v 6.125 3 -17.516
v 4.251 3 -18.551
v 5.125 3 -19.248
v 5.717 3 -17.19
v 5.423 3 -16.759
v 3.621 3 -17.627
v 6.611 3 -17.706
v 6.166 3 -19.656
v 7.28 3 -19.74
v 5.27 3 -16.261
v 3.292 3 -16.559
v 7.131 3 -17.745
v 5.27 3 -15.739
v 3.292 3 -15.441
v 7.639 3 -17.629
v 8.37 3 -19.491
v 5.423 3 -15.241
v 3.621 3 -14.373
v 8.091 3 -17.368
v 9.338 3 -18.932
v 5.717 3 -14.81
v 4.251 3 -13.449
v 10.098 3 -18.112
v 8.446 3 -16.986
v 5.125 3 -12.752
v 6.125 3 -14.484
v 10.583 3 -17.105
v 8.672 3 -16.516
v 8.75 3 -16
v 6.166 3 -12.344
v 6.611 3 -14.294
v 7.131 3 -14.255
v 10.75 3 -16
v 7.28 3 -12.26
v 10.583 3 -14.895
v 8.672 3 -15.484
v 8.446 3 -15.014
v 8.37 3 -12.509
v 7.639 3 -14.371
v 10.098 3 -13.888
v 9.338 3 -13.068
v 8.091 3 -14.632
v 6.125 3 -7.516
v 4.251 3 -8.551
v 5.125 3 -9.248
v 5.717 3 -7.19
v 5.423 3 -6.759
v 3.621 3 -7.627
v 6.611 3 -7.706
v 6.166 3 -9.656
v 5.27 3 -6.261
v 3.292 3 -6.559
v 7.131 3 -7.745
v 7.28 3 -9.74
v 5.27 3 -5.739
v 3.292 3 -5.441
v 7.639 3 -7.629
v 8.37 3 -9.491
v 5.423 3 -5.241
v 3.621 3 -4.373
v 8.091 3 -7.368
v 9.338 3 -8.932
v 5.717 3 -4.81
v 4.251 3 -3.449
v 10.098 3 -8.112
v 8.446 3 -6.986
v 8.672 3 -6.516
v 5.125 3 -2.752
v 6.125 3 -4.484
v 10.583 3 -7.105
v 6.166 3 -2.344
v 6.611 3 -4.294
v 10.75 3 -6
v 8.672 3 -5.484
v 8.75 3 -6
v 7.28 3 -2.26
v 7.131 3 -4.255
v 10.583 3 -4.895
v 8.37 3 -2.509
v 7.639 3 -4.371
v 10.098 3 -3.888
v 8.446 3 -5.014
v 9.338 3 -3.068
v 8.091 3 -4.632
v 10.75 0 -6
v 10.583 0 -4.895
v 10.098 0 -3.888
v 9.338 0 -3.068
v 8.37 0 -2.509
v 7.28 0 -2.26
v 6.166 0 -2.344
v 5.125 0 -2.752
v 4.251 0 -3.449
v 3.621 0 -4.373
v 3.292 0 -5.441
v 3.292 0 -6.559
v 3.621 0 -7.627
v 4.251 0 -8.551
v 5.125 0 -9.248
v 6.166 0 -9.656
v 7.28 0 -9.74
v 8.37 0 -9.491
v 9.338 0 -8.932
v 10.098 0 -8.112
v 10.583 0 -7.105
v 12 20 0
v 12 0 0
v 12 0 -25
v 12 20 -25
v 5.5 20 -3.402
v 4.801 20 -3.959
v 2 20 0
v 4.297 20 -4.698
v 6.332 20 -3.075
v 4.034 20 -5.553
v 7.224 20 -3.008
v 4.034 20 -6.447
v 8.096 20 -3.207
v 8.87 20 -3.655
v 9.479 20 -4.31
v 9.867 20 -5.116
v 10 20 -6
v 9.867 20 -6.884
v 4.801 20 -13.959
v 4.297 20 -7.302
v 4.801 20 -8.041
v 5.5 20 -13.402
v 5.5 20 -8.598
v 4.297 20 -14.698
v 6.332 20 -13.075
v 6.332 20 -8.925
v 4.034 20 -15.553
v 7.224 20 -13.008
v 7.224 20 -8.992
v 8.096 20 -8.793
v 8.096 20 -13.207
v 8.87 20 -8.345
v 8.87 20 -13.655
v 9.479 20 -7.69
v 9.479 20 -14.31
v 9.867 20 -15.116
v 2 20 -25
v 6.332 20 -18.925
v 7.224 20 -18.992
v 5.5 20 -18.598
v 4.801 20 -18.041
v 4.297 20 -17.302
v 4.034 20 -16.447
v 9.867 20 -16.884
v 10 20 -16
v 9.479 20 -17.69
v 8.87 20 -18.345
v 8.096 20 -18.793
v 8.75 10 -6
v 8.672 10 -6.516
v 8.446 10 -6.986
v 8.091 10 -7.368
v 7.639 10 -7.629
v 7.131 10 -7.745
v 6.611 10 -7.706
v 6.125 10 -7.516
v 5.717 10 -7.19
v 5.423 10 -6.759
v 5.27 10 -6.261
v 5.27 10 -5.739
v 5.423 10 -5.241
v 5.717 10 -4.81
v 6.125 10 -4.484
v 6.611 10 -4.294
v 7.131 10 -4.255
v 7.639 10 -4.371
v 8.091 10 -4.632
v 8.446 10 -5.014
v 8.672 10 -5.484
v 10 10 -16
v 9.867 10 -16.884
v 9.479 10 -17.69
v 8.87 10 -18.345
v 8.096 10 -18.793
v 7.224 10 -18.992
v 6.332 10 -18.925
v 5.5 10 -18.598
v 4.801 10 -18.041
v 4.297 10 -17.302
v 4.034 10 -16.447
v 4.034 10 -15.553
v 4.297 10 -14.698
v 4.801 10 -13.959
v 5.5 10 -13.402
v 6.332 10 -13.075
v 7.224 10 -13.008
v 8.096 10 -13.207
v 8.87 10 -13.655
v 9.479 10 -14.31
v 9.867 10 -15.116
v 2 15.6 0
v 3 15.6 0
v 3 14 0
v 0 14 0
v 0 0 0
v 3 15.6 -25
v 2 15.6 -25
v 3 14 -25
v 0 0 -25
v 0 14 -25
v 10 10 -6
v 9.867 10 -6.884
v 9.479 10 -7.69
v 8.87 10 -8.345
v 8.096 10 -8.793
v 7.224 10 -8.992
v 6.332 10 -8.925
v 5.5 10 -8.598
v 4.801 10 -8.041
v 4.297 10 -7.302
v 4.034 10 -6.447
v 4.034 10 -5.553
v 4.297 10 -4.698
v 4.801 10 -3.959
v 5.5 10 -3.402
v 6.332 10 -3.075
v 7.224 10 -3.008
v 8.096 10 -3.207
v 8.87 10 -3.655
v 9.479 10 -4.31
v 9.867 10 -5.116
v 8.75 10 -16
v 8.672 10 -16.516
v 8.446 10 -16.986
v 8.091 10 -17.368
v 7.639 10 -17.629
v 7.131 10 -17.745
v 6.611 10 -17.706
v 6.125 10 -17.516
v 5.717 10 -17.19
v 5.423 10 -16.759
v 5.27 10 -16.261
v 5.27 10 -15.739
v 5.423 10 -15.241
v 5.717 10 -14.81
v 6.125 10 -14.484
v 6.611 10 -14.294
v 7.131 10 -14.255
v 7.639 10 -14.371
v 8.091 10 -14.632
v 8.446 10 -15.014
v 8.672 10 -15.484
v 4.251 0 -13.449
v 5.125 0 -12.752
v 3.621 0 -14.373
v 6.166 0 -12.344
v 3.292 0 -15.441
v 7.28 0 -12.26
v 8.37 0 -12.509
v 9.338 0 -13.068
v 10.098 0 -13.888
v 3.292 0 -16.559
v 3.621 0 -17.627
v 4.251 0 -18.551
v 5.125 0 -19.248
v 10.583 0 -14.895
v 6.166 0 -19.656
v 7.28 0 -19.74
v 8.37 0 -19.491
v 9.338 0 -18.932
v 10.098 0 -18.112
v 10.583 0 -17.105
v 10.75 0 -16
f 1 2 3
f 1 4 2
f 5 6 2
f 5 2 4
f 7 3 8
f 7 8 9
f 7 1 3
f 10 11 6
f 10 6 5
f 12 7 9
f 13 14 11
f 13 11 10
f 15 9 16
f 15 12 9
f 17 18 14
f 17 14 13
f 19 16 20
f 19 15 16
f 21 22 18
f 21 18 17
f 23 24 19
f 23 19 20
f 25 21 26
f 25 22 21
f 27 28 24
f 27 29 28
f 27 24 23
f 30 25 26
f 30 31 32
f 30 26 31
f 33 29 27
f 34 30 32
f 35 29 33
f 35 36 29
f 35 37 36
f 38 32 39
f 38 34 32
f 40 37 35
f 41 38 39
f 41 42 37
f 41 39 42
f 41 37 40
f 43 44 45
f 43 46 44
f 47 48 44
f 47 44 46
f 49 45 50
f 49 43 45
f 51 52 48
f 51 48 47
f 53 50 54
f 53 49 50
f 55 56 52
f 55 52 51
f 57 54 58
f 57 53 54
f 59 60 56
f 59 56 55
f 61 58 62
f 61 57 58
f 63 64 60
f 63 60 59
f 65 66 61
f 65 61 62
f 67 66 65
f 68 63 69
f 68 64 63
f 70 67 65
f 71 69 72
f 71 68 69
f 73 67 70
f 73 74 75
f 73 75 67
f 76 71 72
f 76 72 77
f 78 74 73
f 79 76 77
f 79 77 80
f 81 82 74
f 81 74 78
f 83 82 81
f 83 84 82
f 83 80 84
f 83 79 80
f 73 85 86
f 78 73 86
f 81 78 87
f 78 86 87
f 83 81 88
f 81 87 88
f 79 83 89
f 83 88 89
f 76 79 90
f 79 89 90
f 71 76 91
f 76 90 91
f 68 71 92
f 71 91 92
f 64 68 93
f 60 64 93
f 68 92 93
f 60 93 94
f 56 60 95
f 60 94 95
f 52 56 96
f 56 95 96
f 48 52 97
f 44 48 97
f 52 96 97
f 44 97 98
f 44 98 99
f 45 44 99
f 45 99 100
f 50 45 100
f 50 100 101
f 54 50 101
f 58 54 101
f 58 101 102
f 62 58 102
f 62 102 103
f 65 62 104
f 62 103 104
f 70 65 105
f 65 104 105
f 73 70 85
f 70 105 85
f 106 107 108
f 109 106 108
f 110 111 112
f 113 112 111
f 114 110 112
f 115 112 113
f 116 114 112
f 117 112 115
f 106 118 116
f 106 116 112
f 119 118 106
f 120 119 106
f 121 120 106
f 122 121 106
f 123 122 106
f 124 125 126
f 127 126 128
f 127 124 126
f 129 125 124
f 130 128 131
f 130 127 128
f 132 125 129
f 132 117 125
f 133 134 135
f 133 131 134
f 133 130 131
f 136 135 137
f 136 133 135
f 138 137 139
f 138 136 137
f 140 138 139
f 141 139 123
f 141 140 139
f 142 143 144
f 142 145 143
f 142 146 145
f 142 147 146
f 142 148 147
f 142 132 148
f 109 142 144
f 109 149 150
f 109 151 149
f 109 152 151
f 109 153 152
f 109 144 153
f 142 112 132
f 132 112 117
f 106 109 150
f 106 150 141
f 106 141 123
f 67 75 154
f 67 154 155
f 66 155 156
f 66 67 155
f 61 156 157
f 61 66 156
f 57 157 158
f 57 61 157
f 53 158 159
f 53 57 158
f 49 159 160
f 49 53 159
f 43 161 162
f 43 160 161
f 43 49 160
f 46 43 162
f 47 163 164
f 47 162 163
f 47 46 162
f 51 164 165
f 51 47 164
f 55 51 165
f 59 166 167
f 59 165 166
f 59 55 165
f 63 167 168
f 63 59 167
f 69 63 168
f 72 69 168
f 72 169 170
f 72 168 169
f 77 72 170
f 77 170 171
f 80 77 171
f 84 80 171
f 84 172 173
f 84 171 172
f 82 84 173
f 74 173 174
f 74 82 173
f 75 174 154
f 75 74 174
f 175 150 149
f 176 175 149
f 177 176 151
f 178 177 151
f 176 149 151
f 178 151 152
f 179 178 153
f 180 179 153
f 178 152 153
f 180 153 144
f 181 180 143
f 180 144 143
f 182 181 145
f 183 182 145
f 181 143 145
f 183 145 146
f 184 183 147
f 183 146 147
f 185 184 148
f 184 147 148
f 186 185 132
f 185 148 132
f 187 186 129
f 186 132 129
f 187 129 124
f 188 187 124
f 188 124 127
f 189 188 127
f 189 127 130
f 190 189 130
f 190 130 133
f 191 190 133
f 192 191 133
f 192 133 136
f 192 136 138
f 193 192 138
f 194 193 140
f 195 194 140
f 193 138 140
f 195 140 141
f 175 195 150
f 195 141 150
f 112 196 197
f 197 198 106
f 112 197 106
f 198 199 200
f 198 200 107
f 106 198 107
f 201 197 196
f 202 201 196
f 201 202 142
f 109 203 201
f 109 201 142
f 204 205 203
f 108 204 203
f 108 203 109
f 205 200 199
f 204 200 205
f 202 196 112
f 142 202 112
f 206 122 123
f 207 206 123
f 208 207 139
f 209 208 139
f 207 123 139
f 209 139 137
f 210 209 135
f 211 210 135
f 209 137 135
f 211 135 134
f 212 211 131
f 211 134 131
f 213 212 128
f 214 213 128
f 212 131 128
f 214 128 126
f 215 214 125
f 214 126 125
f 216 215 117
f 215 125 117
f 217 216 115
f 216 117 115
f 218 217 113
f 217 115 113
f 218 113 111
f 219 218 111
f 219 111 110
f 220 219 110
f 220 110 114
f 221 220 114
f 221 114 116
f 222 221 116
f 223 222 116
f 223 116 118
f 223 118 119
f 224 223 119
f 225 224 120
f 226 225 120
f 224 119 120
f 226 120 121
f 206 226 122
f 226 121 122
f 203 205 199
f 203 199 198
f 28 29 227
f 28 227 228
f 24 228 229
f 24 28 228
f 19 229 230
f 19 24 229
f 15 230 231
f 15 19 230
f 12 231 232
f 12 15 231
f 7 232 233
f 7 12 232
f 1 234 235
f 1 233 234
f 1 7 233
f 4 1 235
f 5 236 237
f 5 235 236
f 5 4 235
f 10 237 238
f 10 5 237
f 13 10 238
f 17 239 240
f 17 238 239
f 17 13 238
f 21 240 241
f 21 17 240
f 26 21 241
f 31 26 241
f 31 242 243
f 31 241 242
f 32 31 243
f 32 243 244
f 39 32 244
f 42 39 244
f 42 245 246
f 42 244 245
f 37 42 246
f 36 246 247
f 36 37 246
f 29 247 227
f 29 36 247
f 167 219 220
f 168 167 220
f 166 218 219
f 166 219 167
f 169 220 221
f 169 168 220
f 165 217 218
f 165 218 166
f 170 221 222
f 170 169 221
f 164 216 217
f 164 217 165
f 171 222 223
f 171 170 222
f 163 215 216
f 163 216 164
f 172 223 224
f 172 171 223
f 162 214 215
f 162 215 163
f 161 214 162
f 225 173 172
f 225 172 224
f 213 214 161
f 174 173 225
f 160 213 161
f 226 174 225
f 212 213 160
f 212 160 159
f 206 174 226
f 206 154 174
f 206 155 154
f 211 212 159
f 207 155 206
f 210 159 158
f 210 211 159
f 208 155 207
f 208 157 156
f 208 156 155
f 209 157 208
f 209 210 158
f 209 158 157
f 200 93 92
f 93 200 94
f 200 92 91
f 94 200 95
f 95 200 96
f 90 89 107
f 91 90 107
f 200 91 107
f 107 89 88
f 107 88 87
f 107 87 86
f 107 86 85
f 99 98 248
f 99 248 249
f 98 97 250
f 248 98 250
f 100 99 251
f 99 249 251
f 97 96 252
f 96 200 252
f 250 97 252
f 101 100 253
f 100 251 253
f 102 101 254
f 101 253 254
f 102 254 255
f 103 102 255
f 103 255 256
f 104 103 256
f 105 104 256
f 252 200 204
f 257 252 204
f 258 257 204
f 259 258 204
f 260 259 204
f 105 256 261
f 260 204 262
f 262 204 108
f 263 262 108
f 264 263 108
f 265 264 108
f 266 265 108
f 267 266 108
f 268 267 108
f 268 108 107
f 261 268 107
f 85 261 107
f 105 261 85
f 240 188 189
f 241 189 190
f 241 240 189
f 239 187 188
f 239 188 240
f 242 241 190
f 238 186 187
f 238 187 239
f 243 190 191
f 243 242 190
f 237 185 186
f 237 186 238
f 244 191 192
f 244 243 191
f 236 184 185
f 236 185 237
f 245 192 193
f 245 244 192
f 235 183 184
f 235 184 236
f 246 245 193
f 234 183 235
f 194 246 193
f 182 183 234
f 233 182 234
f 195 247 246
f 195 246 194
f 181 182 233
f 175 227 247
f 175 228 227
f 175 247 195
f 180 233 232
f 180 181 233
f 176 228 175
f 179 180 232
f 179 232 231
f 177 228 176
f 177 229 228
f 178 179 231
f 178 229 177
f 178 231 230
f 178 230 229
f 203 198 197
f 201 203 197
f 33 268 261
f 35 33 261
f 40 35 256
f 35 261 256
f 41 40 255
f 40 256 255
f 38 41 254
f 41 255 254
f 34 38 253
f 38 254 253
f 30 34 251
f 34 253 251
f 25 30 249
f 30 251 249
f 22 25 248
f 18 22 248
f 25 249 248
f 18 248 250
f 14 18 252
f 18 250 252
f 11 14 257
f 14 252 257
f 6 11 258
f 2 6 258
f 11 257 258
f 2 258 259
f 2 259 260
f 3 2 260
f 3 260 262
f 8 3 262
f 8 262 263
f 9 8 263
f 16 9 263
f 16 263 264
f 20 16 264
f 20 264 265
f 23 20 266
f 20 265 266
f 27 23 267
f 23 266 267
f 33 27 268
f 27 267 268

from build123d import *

# Parameters (mm, degrees)
SKETCH_1_W          = 12
SKETCH_1_H          = 25
SKETCH_1_R          = 1.75
EXTRUDE_1_DEPTH     = 20
CUT_EXTRUDE_1_DEPTH = 26
SKETCH_3_R          = 3
CUT_EXTRUDE_2_DEPTH = 10
SKETCH_4_R          = 3.75
CUT_EXTRUDE_3_DEPTH = 3


with BuildPart() as part:
    # Эскиз1 → Бобышка-Вытянуть1 (new body)
    with BuildSketch(Plane(origin=(0, 0, 0), x_dir=(1, 0, 0), z_dir=(0, 1, 0))):
        with Locations((6, 12.5)):
            Rectangle(SKETCH_1_W, SKETCH_1_H)
        with Locations((7, 6)):
            Circle(SKETCH_1_R, mode=Mode.SUBTRACT)
        with Locations((7, 16)):
            Circle(SKETCH_1_R, mode=Mode.SUBTRACT)
    extrude(amount=EXTRUDE_1_DEPTH)

    # Эскиз2 → Вырез-Вытянуть1 (cut, through all)
    with BuildSketch(Plane.XY):
        Polygon((-54.72135955, 14), (0, 14), (3, 14), (3, 15.6), (2, 15.6), (2, 20), (2, 74.72135955), (-77.977073961, 149.429969527), (-134.698433511, 88.708609977), align=None)
    extrude(amount=-CUT_EXTRUDE_1_DEPTH, mode=Mode.SUBTRACT)

    # Эскиз3 → Вырез-Вытянуть2 (cut)
    with BuildSketch(Plane(origin=(0, 20, 0), x_dir=(1, 0, 0), z_dir=(0, 1, 0))):
        with Locations((7, 16)):
            Circle(SKETCH_3_R)
        with Locations((7, 6)):
            Circle(SKETCH_3_R)
    extrude(amount=-CUT_EXTRUDE_2_DEPTH, mode=Mode.SUBTRACT)

    # Эскиз4 → Вырез-Вытянуть3 (cut)
    with BuildSketch(Plane.XZ):
        with Locations((7, -16)):
            Circle(SKETCH_4_R)
        with Locations((7, -6)):
            Circle(SKETCH_4_R)
    extrude(amount=-CUT_EXTRUDE_3_DEPTH, mode=Mode.SUBTRACT)


solid = part.part
